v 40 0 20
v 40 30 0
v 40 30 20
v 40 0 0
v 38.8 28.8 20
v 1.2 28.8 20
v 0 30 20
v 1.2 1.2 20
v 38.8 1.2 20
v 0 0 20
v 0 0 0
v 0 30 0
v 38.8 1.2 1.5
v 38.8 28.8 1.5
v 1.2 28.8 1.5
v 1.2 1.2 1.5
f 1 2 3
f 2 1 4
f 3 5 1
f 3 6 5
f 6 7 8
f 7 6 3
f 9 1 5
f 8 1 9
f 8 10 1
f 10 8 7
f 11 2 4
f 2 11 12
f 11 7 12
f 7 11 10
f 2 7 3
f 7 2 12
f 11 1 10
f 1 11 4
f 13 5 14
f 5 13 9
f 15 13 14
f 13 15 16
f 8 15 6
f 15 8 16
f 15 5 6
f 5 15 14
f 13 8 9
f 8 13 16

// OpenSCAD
$fn = 32;

// ----------------------------------------------------------------------
// Open box: 1.2 mm walls
// ----------------------------------------------------------------------

// --- parameters (mm) ---
box_l = 40;               // outer length, X
box_w = 30;               // outer width, Y
box_h = 20;               // outer height, Z
wall = 1.2;               // wall thickness
floor = 1.5;              // floor thickness

difference() {
  cube([box_l, box_w, box_h]);
  translate([wall, wall, floor])
    cube([box_l - 2 * wall, box_w - 2 * wall, box_h]);
}
